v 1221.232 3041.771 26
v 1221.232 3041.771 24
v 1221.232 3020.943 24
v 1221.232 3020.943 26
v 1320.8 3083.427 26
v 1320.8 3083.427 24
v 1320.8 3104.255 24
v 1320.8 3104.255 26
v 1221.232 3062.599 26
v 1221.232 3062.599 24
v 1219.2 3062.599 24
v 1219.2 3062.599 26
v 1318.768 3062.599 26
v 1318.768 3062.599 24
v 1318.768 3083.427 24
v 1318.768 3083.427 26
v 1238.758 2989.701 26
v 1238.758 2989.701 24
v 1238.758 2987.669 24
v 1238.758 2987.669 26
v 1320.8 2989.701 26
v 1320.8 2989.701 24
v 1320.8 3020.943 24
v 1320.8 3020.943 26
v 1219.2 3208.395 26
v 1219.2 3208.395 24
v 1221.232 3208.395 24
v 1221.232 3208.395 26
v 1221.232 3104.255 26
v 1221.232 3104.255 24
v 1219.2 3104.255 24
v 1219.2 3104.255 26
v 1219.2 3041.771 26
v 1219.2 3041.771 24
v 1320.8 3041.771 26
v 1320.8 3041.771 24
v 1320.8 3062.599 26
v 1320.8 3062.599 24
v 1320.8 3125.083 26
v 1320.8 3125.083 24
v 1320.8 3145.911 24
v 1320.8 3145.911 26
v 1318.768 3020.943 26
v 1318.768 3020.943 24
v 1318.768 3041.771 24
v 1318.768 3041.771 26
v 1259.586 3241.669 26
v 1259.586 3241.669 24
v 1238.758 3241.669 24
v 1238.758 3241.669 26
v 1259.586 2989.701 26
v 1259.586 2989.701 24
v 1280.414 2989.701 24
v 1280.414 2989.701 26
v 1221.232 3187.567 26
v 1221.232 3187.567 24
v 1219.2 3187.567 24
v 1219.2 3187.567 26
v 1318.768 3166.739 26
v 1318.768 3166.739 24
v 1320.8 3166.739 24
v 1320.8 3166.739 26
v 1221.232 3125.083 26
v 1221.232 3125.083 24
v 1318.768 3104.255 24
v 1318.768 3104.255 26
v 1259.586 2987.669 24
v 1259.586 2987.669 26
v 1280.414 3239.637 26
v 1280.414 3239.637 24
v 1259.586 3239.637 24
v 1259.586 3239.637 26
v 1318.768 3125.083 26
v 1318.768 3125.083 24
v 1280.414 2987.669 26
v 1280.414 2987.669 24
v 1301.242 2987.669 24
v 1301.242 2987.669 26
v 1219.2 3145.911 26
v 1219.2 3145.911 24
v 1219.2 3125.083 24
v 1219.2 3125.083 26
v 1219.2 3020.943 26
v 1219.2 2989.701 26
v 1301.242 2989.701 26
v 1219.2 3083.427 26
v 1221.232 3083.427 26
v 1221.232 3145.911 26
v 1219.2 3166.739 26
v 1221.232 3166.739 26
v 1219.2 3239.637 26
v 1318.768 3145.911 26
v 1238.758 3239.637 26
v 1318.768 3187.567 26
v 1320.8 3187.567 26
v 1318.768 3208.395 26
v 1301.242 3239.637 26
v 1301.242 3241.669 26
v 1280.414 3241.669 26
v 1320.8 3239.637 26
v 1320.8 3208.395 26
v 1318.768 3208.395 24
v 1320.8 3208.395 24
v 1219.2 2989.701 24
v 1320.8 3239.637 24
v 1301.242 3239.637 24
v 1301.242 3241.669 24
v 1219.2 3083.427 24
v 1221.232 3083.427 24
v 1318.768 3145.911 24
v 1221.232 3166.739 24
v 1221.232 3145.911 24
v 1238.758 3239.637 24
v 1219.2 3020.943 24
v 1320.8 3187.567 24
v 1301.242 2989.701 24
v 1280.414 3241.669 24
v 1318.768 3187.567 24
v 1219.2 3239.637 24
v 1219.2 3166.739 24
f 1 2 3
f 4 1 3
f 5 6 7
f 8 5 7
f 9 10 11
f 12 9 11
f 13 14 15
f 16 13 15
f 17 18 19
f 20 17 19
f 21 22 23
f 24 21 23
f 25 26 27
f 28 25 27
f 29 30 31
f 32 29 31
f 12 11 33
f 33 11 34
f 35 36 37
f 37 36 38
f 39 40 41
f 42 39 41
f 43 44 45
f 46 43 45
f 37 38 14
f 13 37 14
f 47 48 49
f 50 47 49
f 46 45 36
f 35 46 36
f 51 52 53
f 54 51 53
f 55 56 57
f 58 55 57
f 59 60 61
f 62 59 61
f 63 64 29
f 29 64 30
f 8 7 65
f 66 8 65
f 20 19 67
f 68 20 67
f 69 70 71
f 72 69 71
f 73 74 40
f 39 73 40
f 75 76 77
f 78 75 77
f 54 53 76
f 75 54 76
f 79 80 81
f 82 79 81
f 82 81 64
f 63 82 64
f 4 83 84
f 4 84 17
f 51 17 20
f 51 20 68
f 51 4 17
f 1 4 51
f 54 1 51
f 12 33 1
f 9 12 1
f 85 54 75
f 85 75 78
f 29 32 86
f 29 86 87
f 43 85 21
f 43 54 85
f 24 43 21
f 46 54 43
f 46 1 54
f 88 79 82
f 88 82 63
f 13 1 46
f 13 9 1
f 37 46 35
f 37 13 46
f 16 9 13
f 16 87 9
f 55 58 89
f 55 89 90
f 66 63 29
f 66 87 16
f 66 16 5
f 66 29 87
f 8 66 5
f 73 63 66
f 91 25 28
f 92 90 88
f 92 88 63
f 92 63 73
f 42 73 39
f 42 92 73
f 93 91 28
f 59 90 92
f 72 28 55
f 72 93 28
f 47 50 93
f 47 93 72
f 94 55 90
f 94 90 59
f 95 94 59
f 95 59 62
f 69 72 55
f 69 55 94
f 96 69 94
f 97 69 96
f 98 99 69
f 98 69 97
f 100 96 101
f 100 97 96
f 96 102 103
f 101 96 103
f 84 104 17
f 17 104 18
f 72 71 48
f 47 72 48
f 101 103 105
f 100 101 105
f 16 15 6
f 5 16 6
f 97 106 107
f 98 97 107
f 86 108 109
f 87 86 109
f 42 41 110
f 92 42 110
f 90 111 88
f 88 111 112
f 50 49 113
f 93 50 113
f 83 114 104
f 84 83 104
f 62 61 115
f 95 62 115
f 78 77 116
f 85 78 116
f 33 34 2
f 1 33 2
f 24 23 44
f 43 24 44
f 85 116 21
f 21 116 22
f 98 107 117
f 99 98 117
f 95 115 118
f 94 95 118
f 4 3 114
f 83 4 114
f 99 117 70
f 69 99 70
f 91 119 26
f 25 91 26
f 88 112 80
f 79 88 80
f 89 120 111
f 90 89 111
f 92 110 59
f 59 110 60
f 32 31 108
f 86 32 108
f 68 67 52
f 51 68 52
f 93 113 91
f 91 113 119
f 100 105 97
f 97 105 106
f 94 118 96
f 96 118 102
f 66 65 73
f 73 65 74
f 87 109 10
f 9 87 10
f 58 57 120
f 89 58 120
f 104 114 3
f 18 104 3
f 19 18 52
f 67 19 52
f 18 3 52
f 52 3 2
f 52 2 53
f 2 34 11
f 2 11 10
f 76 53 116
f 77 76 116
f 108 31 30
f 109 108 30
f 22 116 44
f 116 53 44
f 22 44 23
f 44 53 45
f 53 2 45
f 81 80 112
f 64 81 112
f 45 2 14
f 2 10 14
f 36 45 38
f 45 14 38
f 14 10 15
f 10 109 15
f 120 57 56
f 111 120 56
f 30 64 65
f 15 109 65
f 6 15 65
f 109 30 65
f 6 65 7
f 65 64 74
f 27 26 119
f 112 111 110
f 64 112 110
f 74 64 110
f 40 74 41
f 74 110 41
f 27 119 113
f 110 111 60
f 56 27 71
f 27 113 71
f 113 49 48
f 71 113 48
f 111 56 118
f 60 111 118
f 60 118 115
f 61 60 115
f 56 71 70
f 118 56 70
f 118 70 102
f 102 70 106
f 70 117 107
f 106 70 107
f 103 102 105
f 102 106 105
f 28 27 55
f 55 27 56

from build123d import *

# Parameters (mm, degrees)
BOSS_EXTRUDE1_DEPTH = 50
SCALE1_SCALE        = 0.04


with BuildPart() as part:
    # Sketch1 → Boss-Extrude1 (new body)
    with BuildSketch(Plane.XY):
        Polygon((0, 6238.869420035), (0, 5457.819420035), (50.8, 5457.819420035), (50.8, 4937.119420035), (0, 4937.119420035), (0, 4416.419420035), (50.8, 4416.419420035), (50.8, 3895.719420035), (0, 3895.719420035), (0, 3375.019420035), (50.8, 3375.019420035), (50.8, 2854.319420035), (0, 2854.319420035), (0, 2333.619420035), (50.8, 2333.619420035), (50.8, 1812.919420035), (0, 1812.919420035), (0, 1292.219420035), (50.8, 1292.219420035), (50.8, 771.519420035), (0, 771.519420035), (0, 250.819420035), (0, -9.530579965), (488.95, -9.530579965), (488.95, -60.330579965), (1009.65, -60.330579965), (1009.65, -9.530579965), (1530.35, -9.530579965), (1530.35, -60.330579965), (2051.05, -60.330579965), (2051.05, -9.530579965), (2540, -9.530579965), (2540, 771.519420035), (2489.2, 771.519420035), (2489.2, 1292.219420035), (2540, 1292.219420035), (2540, 1812.919420035), (2489.2, 1812.919420035), (2489.2, 2333.619420035), (2540, 2333.619420035), (2540, 2854.319420035), (2489.2, 2854.319420035), (2489.2, 3375.019420035), (2540, 3375.019420035), (2540, 3895.719420035), (2489.2, 3895.719420035), (2489.2, 4416.419420035), (2540, 4416.419420035), (2540, 4937.119420035), (2489.2, 4937.119420035), (2489.2, 5457.819420035), (2540, 5457.819420035), (2540, 5978.519420035), (2540, 6238.869420035), (2051.05, 6238.869420035), (2051.05, 6289.669420035), (1530.35, 6289.669420035), (1530.35, 6238.869420035), (1009.65, 6238.869420035), (1009.65, 6289.669420035), (488.95, 6289.669420035), (488.95, 6238.869420035), align=None)
    extrude(amount=BOSS_EXTRUDE1_DEPTH)


with BuildPart() as part_1:
    # Scale1: scaled about (1270, 3114.669420035, 25)
    add(part.part.scale(SCALE1_SCALE).moved(Location((1219.2, 2990.082643234, 24))))


solid = part_1.part
